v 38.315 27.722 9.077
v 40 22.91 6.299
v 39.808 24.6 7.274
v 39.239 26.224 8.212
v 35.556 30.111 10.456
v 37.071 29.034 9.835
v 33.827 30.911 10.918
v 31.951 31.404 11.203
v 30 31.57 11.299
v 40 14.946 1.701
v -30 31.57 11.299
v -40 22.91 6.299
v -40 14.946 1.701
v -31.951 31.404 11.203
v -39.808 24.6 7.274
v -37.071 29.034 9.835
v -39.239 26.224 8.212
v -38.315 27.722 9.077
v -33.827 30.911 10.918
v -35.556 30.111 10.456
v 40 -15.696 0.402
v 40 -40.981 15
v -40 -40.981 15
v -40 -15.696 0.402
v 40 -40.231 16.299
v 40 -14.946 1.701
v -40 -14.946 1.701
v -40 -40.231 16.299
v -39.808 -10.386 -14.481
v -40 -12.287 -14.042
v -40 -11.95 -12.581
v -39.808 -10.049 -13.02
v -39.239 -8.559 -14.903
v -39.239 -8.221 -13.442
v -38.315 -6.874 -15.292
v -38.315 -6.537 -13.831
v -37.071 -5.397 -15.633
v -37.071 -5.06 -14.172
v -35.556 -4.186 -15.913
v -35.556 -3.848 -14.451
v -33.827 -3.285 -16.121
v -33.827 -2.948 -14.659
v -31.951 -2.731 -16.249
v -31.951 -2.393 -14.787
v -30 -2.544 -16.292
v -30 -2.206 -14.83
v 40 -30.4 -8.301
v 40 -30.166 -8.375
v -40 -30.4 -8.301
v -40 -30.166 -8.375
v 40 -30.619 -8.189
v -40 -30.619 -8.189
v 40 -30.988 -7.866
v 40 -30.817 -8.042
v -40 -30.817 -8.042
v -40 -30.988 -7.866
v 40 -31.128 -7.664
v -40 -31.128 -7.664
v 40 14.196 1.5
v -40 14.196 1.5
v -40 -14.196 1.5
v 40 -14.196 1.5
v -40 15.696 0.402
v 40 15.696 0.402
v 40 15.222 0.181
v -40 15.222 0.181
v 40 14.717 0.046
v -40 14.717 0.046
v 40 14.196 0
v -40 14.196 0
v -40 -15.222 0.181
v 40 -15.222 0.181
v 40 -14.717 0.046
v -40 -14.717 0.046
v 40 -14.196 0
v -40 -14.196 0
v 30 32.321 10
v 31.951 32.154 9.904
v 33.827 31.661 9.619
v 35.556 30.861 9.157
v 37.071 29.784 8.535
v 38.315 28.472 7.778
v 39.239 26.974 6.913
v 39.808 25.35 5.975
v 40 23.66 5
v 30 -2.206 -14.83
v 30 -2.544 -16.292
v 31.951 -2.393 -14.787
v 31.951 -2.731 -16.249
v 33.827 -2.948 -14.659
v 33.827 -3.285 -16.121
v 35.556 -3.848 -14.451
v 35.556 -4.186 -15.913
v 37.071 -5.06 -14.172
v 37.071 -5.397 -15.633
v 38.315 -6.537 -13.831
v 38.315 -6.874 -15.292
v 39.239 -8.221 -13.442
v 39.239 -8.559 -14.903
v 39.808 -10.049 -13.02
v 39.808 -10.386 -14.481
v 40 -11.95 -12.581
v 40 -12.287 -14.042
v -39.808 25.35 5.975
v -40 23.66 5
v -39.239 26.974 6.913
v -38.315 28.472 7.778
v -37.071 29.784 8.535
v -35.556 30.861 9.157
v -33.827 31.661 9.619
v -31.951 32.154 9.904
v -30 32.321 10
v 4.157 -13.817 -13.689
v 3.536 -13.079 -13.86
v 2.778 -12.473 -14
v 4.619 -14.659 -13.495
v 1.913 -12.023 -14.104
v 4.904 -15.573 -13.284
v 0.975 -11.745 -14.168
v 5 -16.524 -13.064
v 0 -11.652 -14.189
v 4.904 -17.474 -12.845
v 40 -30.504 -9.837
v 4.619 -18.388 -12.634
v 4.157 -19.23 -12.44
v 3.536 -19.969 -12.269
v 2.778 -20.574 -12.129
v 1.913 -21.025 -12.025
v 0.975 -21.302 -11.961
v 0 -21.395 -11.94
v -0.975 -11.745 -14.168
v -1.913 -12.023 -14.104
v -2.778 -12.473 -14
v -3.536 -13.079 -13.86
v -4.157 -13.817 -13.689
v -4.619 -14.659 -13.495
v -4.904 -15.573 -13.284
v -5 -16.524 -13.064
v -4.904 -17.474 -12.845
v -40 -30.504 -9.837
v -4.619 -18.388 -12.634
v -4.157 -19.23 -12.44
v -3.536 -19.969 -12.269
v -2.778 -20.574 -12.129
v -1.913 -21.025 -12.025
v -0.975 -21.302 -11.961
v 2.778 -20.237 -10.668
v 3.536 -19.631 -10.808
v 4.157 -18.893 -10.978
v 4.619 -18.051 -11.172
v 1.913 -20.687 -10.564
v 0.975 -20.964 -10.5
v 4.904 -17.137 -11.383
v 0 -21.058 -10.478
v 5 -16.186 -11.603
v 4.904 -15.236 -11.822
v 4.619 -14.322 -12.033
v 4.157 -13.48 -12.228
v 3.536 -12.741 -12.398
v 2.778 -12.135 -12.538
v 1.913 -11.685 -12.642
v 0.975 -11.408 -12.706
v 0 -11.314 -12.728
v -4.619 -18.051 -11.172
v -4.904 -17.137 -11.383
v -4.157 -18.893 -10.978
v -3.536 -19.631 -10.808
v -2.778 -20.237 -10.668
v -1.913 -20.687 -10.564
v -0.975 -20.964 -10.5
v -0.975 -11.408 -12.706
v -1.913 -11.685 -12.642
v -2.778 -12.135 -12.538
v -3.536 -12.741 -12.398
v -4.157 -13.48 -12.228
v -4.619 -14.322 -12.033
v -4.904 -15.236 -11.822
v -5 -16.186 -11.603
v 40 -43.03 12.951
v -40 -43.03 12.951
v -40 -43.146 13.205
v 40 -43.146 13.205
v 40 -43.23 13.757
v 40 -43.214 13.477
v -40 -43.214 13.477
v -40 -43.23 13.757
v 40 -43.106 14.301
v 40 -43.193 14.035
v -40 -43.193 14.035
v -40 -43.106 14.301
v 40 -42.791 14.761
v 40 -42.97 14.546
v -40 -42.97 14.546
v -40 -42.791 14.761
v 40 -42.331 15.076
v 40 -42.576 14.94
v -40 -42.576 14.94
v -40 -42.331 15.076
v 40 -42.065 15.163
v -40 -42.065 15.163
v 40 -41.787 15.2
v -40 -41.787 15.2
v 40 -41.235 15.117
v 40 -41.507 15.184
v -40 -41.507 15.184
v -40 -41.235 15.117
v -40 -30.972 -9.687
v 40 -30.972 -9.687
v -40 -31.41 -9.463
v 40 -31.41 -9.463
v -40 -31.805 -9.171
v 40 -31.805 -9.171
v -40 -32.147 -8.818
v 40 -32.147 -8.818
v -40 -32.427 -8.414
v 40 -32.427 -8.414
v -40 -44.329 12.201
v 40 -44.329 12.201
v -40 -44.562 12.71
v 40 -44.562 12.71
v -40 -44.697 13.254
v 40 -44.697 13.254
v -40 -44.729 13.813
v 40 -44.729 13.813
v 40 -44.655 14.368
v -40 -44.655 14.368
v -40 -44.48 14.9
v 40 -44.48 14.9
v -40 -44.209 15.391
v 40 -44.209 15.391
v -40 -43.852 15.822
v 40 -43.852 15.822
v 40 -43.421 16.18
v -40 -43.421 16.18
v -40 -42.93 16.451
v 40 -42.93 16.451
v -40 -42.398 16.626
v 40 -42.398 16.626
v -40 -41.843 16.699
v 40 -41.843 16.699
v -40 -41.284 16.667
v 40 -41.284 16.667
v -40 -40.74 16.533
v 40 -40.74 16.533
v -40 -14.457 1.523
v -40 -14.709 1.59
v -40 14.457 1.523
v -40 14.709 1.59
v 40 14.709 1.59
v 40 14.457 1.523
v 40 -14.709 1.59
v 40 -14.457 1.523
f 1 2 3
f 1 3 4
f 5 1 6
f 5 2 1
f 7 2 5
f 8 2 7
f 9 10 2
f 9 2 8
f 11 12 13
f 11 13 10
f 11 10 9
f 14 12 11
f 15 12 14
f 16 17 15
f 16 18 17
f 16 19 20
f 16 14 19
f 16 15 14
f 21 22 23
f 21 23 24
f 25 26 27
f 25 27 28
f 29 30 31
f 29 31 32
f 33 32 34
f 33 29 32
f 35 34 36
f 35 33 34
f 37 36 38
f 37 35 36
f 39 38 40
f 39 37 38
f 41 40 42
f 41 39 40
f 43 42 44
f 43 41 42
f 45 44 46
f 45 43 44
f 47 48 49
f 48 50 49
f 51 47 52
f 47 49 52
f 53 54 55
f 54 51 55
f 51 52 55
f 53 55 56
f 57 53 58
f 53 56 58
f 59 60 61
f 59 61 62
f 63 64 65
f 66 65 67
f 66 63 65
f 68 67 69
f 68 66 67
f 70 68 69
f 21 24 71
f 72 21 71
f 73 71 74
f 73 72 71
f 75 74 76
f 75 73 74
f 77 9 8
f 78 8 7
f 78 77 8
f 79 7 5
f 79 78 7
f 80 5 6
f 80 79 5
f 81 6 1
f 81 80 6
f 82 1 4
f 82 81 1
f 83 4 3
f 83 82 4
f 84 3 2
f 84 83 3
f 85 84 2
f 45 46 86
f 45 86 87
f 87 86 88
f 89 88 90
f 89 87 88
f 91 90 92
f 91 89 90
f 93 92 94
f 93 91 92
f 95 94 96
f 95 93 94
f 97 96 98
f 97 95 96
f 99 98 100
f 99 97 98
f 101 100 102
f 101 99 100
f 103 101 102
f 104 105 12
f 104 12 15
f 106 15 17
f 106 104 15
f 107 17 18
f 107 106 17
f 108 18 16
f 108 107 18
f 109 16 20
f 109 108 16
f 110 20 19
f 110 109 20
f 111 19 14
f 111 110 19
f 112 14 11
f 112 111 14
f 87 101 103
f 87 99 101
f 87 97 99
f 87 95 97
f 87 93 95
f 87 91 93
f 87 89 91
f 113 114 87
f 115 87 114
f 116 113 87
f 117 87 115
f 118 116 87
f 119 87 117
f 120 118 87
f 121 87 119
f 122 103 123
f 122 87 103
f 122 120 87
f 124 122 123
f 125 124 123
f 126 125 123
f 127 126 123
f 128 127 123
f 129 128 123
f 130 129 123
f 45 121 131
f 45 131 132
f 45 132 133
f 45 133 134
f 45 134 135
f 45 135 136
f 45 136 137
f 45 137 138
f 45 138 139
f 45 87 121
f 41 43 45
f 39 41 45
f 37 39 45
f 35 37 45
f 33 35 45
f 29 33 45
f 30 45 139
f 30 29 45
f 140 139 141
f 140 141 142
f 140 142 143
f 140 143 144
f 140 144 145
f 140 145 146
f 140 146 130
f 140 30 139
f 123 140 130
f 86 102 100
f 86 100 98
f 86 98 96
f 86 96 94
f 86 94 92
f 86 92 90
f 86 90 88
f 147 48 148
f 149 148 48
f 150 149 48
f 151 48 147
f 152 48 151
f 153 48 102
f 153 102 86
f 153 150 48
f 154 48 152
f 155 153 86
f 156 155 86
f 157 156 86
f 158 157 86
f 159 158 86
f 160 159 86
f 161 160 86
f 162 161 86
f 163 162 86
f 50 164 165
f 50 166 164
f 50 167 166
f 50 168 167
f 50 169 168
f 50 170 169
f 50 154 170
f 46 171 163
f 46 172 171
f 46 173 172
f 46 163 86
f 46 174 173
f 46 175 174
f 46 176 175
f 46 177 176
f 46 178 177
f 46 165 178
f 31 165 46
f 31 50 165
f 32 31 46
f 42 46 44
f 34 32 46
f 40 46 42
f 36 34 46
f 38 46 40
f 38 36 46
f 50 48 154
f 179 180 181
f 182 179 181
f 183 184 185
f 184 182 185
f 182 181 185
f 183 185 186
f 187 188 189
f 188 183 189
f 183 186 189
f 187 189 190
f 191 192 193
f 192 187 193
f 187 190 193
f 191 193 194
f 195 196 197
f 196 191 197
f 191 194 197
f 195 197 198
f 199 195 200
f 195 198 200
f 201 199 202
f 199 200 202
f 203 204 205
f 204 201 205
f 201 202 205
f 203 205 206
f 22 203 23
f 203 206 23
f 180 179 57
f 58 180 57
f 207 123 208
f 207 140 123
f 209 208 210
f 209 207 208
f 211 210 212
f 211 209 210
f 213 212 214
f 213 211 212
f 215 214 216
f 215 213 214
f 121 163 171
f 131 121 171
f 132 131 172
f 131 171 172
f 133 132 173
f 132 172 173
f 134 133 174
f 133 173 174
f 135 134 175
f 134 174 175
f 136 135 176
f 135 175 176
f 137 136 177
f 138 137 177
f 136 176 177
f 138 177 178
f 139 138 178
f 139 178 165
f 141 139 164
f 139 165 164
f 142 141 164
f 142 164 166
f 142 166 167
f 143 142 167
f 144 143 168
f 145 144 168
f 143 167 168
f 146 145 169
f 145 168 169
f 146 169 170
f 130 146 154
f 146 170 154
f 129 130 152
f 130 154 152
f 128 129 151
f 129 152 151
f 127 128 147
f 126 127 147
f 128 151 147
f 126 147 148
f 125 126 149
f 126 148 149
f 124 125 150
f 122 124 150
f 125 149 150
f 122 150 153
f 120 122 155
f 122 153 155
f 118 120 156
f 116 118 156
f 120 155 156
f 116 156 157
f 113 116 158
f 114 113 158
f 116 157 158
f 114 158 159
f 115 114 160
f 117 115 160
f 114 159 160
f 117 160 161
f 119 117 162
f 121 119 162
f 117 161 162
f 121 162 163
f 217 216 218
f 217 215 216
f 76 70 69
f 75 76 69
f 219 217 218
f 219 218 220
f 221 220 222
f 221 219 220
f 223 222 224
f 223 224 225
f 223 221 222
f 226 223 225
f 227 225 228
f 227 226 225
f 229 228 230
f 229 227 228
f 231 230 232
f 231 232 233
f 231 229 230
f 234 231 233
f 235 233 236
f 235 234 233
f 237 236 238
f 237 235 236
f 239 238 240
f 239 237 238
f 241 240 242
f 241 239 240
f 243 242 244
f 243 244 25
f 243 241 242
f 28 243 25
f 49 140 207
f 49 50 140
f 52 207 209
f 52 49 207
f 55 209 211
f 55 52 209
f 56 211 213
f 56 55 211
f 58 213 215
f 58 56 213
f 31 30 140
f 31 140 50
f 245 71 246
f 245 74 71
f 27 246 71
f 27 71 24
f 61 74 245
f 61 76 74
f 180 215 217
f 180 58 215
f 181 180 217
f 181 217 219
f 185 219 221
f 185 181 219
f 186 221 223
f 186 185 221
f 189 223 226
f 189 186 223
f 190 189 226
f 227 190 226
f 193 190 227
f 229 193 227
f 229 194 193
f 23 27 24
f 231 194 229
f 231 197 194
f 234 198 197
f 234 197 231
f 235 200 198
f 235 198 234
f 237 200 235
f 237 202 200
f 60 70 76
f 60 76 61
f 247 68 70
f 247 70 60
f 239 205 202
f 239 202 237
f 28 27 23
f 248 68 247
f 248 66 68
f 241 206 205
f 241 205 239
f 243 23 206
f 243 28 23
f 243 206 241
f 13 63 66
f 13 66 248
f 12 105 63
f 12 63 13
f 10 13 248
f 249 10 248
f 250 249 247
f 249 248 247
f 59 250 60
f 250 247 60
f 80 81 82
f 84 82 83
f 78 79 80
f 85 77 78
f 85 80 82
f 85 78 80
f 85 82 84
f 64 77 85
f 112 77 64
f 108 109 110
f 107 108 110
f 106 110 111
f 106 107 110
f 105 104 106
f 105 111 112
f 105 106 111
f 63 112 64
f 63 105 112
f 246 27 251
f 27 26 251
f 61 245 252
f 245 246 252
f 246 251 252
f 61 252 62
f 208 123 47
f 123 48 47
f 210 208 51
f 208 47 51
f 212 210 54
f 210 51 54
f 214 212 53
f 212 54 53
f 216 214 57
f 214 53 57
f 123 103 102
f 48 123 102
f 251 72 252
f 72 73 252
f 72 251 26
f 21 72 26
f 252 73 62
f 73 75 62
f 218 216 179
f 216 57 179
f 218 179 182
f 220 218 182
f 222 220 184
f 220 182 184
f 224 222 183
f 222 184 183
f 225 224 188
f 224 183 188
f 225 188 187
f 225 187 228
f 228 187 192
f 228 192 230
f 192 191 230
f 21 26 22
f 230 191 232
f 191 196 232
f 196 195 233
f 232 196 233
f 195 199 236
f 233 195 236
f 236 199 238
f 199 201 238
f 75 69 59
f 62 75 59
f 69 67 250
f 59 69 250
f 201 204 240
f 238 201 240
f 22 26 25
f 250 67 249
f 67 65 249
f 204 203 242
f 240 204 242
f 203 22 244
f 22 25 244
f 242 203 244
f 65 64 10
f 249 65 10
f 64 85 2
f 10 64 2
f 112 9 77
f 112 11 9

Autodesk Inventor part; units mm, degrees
ref_plane "YZ Plane" through (0, 0, 0) normal (1, 0, 0) x (0, 1, 0)
ref_plane "XZ Plane" through (0, 0, 0) normal (0, 1, 0) x (-1, 0, 0)
ref_plane "XY Plane" through (0, 0, 0) normal (0, 0, 1) x (1, 0, 0)
sketch "Schizzo1" plane through (0, 0, 0) normal (0, 0, 1) x (1, 0, 0)
  line L0 (-40, 15) -> (40, 15)
  line L1 (40, 15) -> (40, -15)
  line L2 (40, -15) -> (-40, -15)
  line L3 (-40, -15) -> (-40, 15)
  line L4 (-40, 15) -> (40, -15) construction
  line L5 (40, 15) -> (-40, -15) construction
  point P0 (0, 0)
  dimension "d0" = 80
  dimension "d1" = 30
extrude "Piano1" add sketch "Schizzo1" along normal blind 1.5
sketch "Schizzo2" plane through (40, -14.25, 1.299) normal (0, -0.5, -0.8660254) x (1, 0, 0)
  line L0 (-80, 0) -> (0, 0)
  line L1 (0, 0) -> (0, 30)
  line L2 (0, 30) -> (-80, 30)
  line L3 (-80, 30) -> (-80, 0)
edge flange "Flangia1" height 30 angle 30 thickness 1.5 bend radius 1.5 thickness toward (0, -0.5, -0.8660254) relief tear relief width 1.5 relief depth 0.75 edges at (0, -15, 1.5) wall of the first edge with corners at (-40, -14.25, 1.299) (40, -14.25, 1.299) (40, -40.2308, 16.299) (-40, -40.2308, 16.299)
bend "Piega (Bend)1"
corner "Angolo1"
sketch "Schizzo3" plane through (-40, 14.25, 1.299) normal (0, 0.5, -0.8660254) x (-1, 0, 0)
  line L0 (-80, 0) -> (0, 0)
  line L1 (0, 0) -> (0, 20)
  line L2 (0, 20) -> (-80, 20)
  line L3 (-80, 20) -> (-80, 0)
edge flange "Flangia2" height 20 angle 30 thickness 1.5 bend radius 1.5 thickness toward (0, 0.5, -0.8660254) relief tear relief width 1.5 relief depth 0.75 edges at (0, 15, 1.5) wall of the first edge with corners at (40, 14.25, 1.299) (-40, 14.25, 1.299) (-40, 31.5705, 11.299) (40, 31.5705, 11.299)
bend "Piega (Bend)2"
corner "Angolo2"
sketch "Schizzo4" plane through (-40, -43.0298, 12.951) normal (0, -0.8660254, -0.5) x (1, 0, 0)
  line L0 (80, 0) -> (0, 0)
  line L1 (0, 0) -> (0, -23.8038)
  line L2 (0, -23.8038) -> (80, -23.8038)
  line L3 (80, -23.8038) -> (80, 0)
edge flange "Flangia3" height 35 angle 150 thickness 1.5 bend radius 1.5 thickness toward (0, -0.8660254, -0.5) relief tear relief width 1.5 relief depth 0.75 edges at (0, -40.9808, 15) wall of the first edge with corners at (40, -43.0298, 12.951) (-40, -43.0298, 12.951) (-40, -31.1279, -7.6638) (40, -31.1279, -7.6638)
bend "Piega (Bend)3"
corner "Angolo3"
sketch "Schizzo6" plane through (-40, -30.1663, -8.3753) normal (0, -0.2249511, -0.9743701) x (1, 0, 0)
  line L0 (80, 0) -> (0, 0)
  line L1 (0, 0) -> (0, -28.6956)
  line L2 (0, -28.6956) -> (80, -28.6956)
  line L3 (80, -28.6956) -> (80, 0)
edge flange "Flangia5" height 30 angle 47 thickness 1.5 bend radius 1.5 thickness toward (0, -0.2249511, -0.9743701) relief tear relief width 1.5 relief depth 0.75 edges at (0, -31.1279, -7.6638) wall of the first edge with corners at (40, -30.1663, -8.3753) (-40, -30.1663, -8.3753) (-40, -2.2062, -14.8304) (40, -2.2062, -14.8304)
bend "Piega (Bend)5"
corner "Angolo5"
sketch "Schizzo7" plane through (40, -2.5436, -16.292) normal (0, -0.2249511, -0.9743701) x (-1, 0, 0)
  line L0 (80, 0) -> (80, -28.6956) projected
  line L1 (0, 0) -> (80, 0) projected
  point P0 (40, -1.1865)
  point P1 (40, -14.3478)
  point P2 (80, -14.3478)
  point P3 (40, 0)
hole "Foro1" at (0, -16.5236, -13.0644) direction (0, 0.2249511, 0.9743701) diameter 10 depth 1.5 tip angle 118
fillet "Arrotondamento angolo1" radius 10 4 edges at (-40, 31.9455, 10.6495) (40, 31.9455, 10.6495) (40, -2.3749, -15.5612) (-40, -2.3749, -15.5612)
equation "\"d58\" = Spessore"
equation "\"d2\" = Spessore"
equation "\"d3\" = LarghezzaScaricoPiega"
equation "\"d4\" = ProfonditàScaricoPiega"
equation "\"d5\" = ResiduoMinimo"
equation "\"d6\" = RaggioTransizione"
equation "\"d9\" = RaggioPiega"
equation "\"d10\" = DimensioniScaricoAngolo"
equation "\"d11\" = DimensioneGioco"
equation "\"d12\" = Dimensione_raggio_Jacobi"
equation "\"d13\" = LarghezzaScaricoPiega"
equation "\"d14\" = ProfonditàScaricoPiega"
equation "\"d15\" = ResiduoMinimo"
equation "\"d16\" = RaggioTransizione"
equation "\"d19\" = RaggioPiega"
equation "\"d20\" = DimensioniScaricoAngolo"
equation "\"d21\" = DimensioneGioco"
equation "\"d22\" = Dimensione_raggio_Jacobi"
equation "\"d23\" = LarghezzaScaricoPiega"
equation "\"d24\" = ProfonditàScaricoPiega"
equation "\"d25\" = ResiduoMinimo"
equation "\"d26\" = RaggioTransizione"
equation "\"d29\" = RaggioPiega"
equation "\"d30\" = DimensioniScaricoAngolo"
equation "\"d31\" = DimensioneGioco"
equation "\"d32\" = Dimensione_raggio_Jacobi"
equation "\"d43\" = LarghezzaScaricoPiega"
equation "\"d44\" = ProfonditàScaricoPiega"
equation "\"d45\" = ResiduoMinimo"
equation "\"d46\" = RaggioTransizione"
equation "\"d49\" = RaggioPiega"
equation "\"d50\" = DimensioniScaricoAngolo"
equation "\"d51\" = DimensioneGioco"
equation "\"d52\" = Dimensione_raggio_Jacobi"
equation "\"RaggioPiega\" = Spessore"
equation "\"LarghezzaScaricoPiega\" = Spessore"
equation "\"ProfonditàScaricoPiega\" = 0.5 * Spessore"
equation "\"DimensioniScaricoAngolo\" = 4 * Spessore"
equation "\"ResiduoMinimo\" = 2 * Spessore"
equation "\"RaggioTransizione\" = RaggioPiega"
equation "\"Dimensione_raggio_Jacobi\" = RaggioPiega"
equation "\"DimensioneGioco\" = Spessore"
equation "\"Spessore\" = 1.5"
properties part number "Lamiera pinza"
